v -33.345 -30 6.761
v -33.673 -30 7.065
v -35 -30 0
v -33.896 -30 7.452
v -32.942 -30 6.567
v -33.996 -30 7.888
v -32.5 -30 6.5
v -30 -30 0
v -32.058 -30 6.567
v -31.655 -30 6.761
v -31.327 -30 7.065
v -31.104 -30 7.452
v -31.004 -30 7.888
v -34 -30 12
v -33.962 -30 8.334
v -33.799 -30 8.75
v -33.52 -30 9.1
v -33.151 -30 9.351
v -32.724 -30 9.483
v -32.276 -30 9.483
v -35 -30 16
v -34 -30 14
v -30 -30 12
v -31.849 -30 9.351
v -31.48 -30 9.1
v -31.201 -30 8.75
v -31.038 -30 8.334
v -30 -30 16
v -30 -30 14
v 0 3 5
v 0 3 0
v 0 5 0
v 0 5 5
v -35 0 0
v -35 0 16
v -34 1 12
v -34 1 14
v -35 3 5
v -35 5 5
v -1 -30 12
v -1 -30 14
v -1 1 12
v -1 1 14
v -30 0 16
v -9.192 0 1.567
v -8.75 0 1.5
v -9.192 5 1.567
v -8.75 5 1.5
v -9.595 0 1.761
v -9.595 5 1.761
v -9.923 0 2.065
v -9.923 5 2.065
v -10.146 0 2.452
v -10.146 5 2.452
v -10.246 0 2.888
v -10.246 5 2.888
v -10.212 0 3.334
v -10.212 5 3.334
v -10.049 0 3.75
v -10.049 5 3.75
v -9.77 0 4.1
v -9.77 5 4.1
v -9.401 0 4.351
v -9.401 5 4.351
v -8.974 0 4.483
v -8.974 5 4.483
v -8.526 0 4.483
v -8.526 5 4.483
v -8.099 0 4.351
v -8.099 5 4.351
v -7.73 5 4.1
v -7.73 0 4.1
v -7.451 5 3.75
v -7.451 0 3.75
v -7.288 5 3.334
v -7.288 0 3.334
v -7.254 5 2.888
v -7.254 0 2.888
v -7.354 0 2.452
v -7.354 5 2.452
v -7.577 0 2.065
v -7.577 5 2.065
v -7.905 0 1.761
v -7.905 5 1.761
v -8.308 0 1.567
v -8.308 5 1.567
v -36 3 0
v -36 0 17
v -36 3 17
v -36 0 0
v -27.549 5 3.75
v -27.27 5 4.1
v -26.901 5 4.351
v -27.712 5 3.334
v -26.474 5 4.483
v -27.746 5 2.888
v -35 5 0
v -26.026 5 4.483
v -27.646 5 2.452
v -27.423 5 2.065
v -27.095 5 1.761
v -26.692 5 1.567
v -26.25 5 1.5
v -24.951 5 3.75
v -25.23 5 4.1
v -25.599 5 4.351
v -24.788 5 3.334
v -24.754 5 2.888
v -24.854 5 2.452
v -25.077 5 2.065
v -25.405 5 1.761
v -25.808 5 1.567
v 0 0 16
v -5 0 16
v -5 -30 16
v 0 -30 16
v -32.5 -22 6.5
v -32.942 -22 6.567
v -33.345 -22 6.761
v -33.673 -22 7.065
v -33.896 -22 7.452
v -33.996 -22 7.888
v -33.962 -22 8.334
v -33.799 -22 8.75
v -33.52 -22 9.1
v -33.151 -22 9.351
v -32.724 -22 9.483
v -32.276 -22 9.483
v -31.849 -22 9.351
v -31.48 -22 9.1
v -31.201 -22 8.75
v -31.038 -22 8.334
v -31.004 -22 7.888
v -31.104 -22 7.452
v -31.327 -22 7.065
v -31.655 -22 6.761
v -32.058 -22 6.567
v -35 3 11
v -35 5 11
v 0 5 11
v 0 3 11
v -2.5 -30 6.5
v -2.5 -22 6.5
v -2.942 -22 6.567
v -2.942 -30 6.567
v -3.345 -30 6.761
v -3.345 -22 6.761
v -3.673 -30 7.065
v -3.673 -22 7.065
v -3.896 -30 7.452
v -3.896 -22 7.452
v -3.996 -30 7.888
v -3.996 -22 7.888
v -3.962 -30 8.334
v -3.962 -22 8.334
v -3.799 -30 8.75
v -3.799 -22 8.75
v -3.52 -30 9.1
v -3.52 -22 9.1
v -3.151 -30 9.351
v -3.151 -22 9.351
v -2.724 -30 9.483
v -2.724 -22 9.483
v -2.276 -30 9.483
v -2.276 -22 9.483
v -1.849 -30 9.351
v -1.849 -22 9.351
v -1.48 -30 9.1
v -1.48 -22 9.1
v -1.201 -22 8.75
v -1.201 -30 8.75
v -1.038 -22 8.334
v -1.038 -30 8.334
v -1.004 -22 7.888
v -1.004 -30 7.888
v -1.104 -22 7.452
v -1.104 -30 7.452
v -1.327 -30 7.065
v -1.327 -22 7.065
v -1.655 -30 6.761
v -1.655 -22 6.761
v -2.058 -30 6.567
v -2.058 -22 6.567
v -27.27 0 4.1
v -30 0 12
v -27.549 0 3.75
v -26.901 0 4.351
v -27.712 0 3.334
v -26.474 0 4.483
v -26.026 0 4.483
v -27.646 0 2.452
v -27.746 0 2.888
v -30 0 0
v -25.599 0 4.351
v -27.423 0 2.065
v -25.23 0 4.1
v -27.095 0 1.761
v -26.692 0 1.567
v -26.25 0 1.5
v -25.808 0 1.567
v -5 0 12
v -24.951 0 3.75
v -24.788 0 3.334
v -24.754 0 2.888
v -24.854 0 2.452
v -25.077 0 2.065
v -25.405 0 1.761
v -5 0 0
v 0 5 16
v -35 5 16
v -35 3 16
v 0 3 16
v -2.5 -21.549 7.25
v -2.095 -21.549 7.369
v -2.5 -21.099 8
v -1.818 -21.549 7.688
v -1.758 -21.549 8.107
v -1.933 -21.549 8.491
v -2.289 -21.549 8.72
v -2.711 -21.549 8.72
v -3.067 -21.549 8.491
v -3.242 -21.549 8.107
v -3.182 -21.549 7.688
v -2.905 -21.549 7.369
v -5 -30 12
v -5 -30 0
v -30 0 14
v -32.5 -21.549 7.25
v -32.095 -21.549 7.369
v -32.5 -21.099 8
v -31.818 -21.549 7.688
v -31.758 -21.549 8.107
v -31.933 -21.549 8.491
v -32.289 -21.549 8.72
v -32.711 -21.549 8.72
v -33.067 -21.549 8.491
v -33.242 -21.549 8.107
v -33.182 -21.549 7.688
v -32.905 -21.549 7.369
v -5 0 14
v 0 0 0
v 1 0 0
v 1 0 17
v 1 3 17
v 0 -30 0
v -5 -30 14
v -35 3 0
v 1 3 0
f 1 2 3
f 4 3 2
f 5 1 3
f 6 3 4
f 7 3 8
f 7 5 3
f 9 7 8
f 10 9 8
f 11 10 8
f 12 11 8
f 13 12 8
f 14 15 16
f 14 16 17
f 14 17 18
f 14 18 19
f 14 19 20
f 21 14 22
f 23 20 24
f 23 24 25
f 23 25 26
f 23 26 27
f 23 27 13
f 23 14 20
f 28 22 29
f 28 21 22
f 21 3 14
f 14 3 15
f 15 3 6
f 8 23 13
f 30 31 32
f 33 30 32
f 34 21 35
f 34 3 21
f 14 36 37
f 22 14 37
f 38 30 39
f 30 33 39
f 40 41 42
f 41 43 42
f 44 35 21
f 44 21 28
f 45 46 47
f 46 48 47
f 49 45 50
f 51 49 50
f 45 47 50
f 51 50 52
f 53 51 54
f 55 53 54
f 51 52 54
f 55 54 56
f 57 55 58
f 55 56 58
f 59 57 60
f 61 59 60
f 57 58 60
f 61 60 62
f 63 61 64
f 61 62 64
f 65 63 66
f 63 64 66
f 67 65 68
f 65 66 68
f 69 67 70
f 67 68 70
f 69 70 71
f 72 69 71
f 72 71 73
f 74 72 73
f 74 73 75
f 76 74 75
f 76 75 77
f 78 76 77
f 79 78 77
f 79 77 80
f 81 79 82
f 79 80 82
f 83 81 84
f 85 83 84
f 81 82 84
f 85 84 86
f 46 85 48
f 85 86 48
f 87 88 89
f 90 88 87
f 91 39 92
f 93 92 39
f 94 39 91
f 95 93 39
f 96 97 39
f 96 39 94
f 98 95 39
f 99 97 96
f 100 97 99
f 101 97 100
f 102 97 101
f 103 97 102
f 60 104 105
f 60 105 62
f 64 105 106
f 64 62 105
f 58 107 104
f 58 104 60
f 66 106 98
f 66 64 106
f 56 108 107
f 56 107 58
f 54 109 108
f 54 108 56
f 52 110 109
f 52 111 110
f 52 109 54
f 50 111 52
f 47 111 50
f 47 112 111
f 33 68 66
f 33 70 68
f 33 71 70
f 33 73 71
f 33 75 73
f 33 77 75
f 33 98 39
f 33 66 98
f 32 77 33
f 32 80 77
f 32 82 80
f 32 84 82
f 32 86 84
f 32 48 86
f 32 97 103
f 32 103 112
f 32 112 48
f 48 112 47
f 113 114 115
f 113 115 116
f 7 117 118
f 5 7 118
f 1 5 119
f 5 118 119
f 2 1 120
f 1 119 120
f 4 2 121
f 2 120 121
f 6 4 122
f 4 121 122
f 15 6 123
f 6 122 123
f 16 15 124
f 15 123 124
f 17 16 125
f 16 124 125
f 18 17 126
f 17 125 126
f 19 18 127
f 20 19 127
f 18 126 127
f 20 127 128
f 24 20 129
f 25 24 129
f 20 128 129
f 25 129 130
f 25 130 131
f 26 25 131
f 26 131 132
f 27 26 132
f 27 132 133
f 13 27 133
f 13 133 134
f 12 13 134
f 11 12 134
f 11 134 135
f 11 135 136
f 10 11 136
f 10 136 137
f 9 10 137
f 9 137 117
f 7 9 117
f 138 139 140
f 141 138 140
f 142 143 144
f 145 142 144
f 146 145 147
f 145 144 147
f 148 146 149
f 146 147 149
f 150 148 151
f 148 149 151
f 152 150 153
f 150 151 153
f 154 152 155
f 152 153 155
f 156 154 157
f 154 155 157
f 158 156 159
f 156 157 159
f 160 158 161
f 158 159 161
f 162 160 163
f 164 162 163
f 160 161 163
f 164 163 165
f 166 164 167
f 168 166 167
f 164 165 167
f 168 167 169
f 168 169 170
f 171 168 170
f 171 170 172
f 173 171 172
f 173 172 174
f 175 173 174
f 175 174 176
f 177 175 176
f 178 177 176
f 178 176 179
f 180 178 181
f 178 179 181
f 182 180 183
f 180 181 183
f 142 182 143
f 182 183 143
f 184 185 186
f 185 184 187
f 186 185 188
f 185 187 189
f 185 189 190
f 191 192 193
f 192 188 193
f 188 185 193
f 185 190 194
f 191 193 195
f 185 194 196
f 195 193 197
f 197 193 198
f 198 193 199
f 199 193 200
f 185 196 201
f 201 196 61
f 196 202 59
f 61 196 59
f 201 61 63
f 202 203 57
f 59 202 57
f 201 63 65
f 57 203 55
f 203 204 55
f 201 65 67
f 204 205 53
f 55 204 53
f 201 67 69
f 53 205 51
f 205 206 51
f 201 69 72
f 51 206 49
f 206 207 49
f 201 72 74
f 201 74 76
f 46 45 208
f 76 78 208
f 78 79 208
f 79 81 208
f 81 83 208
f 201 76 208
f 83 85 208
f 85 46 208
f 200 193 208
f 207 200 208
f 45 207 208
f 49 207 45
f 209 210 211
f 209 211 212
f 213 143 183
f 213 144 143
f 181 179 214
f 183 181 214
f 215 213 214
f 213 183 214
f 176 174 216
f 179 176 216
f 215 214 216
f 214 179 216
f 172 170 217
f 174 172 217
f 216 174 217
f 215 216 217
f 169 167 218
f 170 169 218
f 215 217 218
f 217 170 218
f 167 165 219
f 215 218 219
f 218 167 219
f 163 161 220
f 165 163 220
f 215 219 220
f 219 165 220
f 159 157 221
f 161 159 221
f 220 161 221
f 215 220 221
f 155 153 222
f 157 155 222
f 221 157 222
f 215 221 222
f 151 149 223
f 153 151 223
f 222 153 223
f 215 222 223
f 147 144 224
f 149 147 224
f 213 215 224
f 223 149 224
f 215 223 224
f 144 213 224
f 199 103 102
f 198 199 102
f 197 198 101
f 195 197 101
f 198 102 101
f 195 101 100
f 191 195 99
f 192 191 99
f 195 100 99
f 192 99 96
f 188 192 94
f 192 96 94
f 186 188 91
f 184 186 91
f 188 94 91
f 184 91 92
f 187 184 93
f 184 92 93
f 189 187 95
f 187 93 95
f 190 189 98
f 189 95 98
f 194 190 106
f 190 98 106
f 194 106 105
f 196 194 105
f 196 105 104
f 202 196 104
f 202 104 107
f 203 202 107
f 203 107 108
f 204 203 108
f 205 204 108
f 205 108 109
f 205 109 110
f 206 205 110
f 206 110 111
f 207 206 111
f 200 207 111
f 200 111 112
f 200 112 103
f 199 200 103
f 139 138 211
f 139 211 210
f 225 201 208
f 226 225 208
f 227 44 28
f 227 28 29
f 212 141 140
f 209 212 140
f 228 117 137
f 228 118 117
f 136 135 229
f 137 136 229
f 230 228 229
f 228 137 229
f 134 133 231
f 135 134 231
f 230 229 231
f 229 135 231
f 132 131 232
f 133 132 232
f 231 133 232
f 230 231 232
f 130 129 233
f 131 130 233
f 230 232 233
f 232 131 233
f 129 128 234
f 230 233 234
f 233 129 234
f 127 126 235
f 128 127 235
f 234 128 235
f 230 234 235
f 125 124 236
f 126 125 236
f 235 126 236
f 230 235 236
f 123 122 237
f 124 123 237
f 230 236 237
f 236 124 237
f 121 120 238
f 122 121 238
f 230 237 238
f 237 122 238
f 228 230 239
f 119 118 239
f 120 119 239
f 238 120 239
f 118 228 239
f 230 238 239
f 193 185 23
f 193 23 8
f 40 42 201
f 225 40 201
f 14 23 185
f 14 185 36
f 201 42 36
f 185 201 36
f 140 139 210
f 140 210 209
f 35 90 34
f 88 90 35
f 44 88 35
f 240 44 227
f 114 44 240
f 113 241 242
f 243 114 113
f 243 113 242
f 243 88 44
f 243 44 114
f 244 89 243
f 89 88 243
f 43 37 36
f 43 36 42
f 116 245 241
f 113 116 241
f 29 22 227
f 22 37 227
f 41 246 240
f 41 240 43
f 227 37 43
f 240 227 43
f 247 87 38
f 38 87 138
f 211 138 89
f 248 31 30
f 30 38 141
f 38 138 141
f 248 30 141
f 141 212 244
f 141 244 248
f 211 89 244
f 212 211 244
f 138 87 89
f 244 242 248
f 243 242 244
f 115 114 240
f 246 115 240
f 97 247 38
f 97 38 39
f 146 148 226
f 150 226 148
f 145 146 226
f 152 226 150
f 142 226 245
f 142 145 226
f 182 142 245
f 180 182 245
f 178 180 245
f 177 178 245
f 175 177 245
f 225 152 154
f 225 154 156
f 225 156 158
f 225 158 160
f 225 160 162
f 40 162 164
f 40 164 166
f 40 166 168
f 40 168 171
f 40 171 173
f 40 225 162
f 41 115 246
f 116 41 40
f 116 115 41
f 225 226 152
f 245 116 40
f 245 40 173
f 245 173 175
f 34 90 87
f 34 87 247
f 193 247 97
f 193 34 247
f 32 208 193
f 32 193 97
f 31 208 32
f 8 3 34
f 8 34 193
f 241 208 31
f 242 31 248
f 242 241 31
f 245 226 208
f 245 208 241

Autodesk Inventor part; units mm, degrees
ref_plane "YZ Plane" through (0, 0, 0) normal (1, 0, 0) x (0, 1, 0)
ref_plane "XZ Plane" through (0, 0, 0) normal (0, 1, 0) x (-1, 0, 0)
ref_plane "XY Plane" through (0, 0, 0) normal (0, 0, 1) x (1, 0, 0)
sketch "Sketch1" plane through (0, 0, 0) normal (0, 1, 0) x (-1, 0, 0)
  line L0 (0, 0) -> (35, 0)
  line L1 (35, 0) -> (35, 6)
  line L2 (0, 6) -> (35, 6)
  line L3 (0, 0) -> (0, 6)
  line L4 (0, 6) -> (0, 0)
  line L5 (0, 3) -> (35, 3)
  line L6 (17.5, 3) -> (35, 3)
  line L7 (17.5, 3) -> (0, 3)
  point P0 (17.5, 0)
  point P1 (8.75, 3)
  point P2 (26.25, 3)
extrude "Extrusion1" add sketch "Sketch1" along normal blind 5
sketch "Sketch2" plane through (-35, 0, 6) normal (0, 0, 1) x (1, 0, 0)
  line L0 (0, 0) -> (35, 0) projected
  line L1 (35, 0) -> (35, 5) projected
  line L2 (0, 5) -> (35, 5) projected
  line L3 (0, 0) -> (0, 5) projected
extrude "Extrusion2" add sketch "Sketch2" along normal blind 10
sketch "Sketch3" plane through (0, 5, 0) normal (0, 1, 0) x (1, 0, 0)
  line L0 (0, 0) -> (0, -16) projected
  line L1 (0, 0) -> (-35, 0) projected
  line L2 (-35, 0) -> (-35, -16) projected
  line L3 (0, -16) -> (-35, -16) projected
  line L4 (-35, 0) -> (-35, -16) projected
  line L5 (-35, -11) -> (0, -11)
  line L6 (0, -11) -> (0, -5)
  line L7 (0, -5) -> (-35, -5)
  line L8 (-35, -5) -> (-35, -11)
  dimension "d4" = 5
  dimension "d5" = 5
extrude "Extrusion3" cut sketch "Sketch3" against normal blind 2 contours L0 L5 L2 L7
sketch "Sketch4" plane through (0, 0, 0) normal (0, -1, 0) x (1, 0, 0)
  line L0 (-35, 0) -> (0, 0)
  line L1 (0, 0) -> (0, 6)
  line L2 (-35, 6) -> (0, 6)
  line L3 (-35, 0) -> (-35, 6)
  line L4 (-35, 6) -> (-35, 0)
  line L5 (-35, 3) -> (0, 3)
  line L6 (-17.5, 3) -> (0, 3)
  line L7 (-17.5, 3) -> (-35, 3)
  point P0 (0, 0)
  point P1 (-17.5, 0)
  point P2 (-8.75, 3)
  point P3 (-26.25, 3)
hole "Hole1" at (-8.75, 0, 3) at (-26.25, 0, 3) direction (0, 1, 0) diameter 3 depth 8 tip angle 118
sketch "Sketch6" plane through (0, 0, 0) normal (0, -1, 0) x (1, 0, 0)
  circle A0 centre (-8.75, 3) radius 1.5 projected
  circle A1 centre (-26.25, 3) radius 1.5 projected
  line L0 (-35, 0) -> (-35, 16) projected
  line L1 (0, 0) -> (-35, 0) projected
  line L2 (0, 0) -> (0, 16) projected
  line L3 (-35, 16) -> (0, 16) projected
  line L4 (-35, 16) -> (-30, 16)
  line L5 (-30, 16) -> (-30, 0)
  line L6 (-30, 0) -> (-35, 0)
  line L7 (-35, 0) -> (-35, 16)
  line L8 (-35, 16) -> (0, 16) projected
  line L9 (0, 16) -> (-5, 16)
  line L10 (-5, 16) -> (-5, 0)
  line L11 (-5, 0) -> (0, 0)
  line L12 (0, 0) -> (0, 16)
  line L13 (-30, 13) -> (-5, 13)
  line L14 (-34, 14) -> (-1, 14)
  line L15 (-1, 14) -> (-1, 12)
  line L16 (-1, 12) -> (-34, 12)
  line L17 (-34, 12) -> (-34, 14)
  line L18 (-34, 14) -> (-1, 12) construction
  line L19 (-1, 14) -> (-34, 12) construction
  line L20 (-36, 17) -> (-36, 0)
  line L21 (-36, 0) -> (1, 0)
  line L22 (1, 0) -> (1, 17)
  line L23 (-36, 17) -> (1, 17)
  point P0 (-17.5, 13)
  dimension "d23" = 5
  dimension "d24" = 16
  dimension "d25" = 5
  dimension "d26" = 16
  dimension "d27" = 3
  dimension "d28" = 33
  dimension "d29" = 2
  dimension "d30" = 1
  dimension "d31" = 1
  dimension "d32" = 1
  dimension "d33" = 0
extrude "Extrusion5" add sketch "Sketch6" along normal blind 30 contours L0 L3 L5 L14 L17 L16 L1 | L10 L16 L15 L14 L3 L2 L1 | L16 L17 L14 L5 | L10 L14 L15 L16
extrude "Extrusion6" cut sketch "Sketch6" along normal blind 35 and the other way blind 1 contours L16 L17 L14 L5 | L5 L13 L10 L16 | L14 L10 L13 L5 | L10 L14 L15 L16
extrude "Extrusion7" add sketch "Sketch6" against normal up to surface (3 mm away) contours L21 L20 L23 L22 L2 L3 L0
sketch "Sketch7" plane through (0, -30, 0) normal (0, -1, 0) x (1, 0, 0)
  line L0 (-30, 12) -> (-34, 12) projected
  line L1 (-34, 12) -> (-34, 14) projected
  line L2 (-34, 14) -> (-30, 14) projected
  line L3 (-30, 14) -> (-30, 16) projected
  line L4 (-30, 16) -> (-35, 16) projected
  line L5 (-35, 16) -> (-35, 0) projected
  line L6 (-35, 0) -> (-30, 0) projected
  line L7 (-30, 0) -> (-30, 12) projected
  line L8 (-1, 12) -> (-5, 12) projected
  line L9 (-5, 12) -> (-5, 0) projected
  line L10 (-5, 0) -> (0, 0) projected
  line L11 (0, 0) -> (0, 16) projected
  line L12 (0, 16) -> (-5, 16) projected
  line L13 (-5, 16) -> (-5, 14) projected
  line L14 (-5, 14) -> (-1, 14) projected
  line L15 (-1, 14) -> (-1, 12) projected
  point P0 (0, 0)
sketch "Sketch8" plane through (0, -30, 0) normal (0, -1, 0) x (1, 0, 0)
  line L0 (-30, 12) -> (-34, 12) projected
  line L1 (-34, 12) -> (-34, 14) projected
  line L2 (-34, 14) -> (-30, 14) projected
  line L3 (-30, 14) -> (-30, 16) projected
  line L4 (-30, 16) -> (-35, 16) projected
  line L5 (-35, 16) -> (-35, 0) projected
  line L6 (-35, 0) -> (-30, 0) projected
  line L7 (-30, 0) -> (-30, 12) projected
  line L8 (-1, 12) -> (-5, 12) projected
  line L9 (-5, 12) -> (-5, 0) projected
  line L10 (-5, 0) -> (0, 0) projected
  line L11 (0, 0) -> (0, 16) projected
  line L12 (0, 16) -> (-5, 16) projected
  line L13 (-5, 16) -> (-5, 14) projected
  line L14 (-5, 14) -> (-1, 14) projected
  line L15 (-1, 14) -> (-1, 12) projected
  line L16 (-35, 16) -> (-30, 0)
  line L17 (-5, 0) -> (0, 16)
  point P0 (0, 0)
  point P1 (-32.5, 8)
  point P2 (-2.5, 8)
hole "Hole2" at (-32.5, -30, 8) at (-2.5, -30, 8) direction (0, 1, 0) diameter 3 depth 8 tip angle 118
properties part number "slide_sensor_clip" material "ABS Plastic"
